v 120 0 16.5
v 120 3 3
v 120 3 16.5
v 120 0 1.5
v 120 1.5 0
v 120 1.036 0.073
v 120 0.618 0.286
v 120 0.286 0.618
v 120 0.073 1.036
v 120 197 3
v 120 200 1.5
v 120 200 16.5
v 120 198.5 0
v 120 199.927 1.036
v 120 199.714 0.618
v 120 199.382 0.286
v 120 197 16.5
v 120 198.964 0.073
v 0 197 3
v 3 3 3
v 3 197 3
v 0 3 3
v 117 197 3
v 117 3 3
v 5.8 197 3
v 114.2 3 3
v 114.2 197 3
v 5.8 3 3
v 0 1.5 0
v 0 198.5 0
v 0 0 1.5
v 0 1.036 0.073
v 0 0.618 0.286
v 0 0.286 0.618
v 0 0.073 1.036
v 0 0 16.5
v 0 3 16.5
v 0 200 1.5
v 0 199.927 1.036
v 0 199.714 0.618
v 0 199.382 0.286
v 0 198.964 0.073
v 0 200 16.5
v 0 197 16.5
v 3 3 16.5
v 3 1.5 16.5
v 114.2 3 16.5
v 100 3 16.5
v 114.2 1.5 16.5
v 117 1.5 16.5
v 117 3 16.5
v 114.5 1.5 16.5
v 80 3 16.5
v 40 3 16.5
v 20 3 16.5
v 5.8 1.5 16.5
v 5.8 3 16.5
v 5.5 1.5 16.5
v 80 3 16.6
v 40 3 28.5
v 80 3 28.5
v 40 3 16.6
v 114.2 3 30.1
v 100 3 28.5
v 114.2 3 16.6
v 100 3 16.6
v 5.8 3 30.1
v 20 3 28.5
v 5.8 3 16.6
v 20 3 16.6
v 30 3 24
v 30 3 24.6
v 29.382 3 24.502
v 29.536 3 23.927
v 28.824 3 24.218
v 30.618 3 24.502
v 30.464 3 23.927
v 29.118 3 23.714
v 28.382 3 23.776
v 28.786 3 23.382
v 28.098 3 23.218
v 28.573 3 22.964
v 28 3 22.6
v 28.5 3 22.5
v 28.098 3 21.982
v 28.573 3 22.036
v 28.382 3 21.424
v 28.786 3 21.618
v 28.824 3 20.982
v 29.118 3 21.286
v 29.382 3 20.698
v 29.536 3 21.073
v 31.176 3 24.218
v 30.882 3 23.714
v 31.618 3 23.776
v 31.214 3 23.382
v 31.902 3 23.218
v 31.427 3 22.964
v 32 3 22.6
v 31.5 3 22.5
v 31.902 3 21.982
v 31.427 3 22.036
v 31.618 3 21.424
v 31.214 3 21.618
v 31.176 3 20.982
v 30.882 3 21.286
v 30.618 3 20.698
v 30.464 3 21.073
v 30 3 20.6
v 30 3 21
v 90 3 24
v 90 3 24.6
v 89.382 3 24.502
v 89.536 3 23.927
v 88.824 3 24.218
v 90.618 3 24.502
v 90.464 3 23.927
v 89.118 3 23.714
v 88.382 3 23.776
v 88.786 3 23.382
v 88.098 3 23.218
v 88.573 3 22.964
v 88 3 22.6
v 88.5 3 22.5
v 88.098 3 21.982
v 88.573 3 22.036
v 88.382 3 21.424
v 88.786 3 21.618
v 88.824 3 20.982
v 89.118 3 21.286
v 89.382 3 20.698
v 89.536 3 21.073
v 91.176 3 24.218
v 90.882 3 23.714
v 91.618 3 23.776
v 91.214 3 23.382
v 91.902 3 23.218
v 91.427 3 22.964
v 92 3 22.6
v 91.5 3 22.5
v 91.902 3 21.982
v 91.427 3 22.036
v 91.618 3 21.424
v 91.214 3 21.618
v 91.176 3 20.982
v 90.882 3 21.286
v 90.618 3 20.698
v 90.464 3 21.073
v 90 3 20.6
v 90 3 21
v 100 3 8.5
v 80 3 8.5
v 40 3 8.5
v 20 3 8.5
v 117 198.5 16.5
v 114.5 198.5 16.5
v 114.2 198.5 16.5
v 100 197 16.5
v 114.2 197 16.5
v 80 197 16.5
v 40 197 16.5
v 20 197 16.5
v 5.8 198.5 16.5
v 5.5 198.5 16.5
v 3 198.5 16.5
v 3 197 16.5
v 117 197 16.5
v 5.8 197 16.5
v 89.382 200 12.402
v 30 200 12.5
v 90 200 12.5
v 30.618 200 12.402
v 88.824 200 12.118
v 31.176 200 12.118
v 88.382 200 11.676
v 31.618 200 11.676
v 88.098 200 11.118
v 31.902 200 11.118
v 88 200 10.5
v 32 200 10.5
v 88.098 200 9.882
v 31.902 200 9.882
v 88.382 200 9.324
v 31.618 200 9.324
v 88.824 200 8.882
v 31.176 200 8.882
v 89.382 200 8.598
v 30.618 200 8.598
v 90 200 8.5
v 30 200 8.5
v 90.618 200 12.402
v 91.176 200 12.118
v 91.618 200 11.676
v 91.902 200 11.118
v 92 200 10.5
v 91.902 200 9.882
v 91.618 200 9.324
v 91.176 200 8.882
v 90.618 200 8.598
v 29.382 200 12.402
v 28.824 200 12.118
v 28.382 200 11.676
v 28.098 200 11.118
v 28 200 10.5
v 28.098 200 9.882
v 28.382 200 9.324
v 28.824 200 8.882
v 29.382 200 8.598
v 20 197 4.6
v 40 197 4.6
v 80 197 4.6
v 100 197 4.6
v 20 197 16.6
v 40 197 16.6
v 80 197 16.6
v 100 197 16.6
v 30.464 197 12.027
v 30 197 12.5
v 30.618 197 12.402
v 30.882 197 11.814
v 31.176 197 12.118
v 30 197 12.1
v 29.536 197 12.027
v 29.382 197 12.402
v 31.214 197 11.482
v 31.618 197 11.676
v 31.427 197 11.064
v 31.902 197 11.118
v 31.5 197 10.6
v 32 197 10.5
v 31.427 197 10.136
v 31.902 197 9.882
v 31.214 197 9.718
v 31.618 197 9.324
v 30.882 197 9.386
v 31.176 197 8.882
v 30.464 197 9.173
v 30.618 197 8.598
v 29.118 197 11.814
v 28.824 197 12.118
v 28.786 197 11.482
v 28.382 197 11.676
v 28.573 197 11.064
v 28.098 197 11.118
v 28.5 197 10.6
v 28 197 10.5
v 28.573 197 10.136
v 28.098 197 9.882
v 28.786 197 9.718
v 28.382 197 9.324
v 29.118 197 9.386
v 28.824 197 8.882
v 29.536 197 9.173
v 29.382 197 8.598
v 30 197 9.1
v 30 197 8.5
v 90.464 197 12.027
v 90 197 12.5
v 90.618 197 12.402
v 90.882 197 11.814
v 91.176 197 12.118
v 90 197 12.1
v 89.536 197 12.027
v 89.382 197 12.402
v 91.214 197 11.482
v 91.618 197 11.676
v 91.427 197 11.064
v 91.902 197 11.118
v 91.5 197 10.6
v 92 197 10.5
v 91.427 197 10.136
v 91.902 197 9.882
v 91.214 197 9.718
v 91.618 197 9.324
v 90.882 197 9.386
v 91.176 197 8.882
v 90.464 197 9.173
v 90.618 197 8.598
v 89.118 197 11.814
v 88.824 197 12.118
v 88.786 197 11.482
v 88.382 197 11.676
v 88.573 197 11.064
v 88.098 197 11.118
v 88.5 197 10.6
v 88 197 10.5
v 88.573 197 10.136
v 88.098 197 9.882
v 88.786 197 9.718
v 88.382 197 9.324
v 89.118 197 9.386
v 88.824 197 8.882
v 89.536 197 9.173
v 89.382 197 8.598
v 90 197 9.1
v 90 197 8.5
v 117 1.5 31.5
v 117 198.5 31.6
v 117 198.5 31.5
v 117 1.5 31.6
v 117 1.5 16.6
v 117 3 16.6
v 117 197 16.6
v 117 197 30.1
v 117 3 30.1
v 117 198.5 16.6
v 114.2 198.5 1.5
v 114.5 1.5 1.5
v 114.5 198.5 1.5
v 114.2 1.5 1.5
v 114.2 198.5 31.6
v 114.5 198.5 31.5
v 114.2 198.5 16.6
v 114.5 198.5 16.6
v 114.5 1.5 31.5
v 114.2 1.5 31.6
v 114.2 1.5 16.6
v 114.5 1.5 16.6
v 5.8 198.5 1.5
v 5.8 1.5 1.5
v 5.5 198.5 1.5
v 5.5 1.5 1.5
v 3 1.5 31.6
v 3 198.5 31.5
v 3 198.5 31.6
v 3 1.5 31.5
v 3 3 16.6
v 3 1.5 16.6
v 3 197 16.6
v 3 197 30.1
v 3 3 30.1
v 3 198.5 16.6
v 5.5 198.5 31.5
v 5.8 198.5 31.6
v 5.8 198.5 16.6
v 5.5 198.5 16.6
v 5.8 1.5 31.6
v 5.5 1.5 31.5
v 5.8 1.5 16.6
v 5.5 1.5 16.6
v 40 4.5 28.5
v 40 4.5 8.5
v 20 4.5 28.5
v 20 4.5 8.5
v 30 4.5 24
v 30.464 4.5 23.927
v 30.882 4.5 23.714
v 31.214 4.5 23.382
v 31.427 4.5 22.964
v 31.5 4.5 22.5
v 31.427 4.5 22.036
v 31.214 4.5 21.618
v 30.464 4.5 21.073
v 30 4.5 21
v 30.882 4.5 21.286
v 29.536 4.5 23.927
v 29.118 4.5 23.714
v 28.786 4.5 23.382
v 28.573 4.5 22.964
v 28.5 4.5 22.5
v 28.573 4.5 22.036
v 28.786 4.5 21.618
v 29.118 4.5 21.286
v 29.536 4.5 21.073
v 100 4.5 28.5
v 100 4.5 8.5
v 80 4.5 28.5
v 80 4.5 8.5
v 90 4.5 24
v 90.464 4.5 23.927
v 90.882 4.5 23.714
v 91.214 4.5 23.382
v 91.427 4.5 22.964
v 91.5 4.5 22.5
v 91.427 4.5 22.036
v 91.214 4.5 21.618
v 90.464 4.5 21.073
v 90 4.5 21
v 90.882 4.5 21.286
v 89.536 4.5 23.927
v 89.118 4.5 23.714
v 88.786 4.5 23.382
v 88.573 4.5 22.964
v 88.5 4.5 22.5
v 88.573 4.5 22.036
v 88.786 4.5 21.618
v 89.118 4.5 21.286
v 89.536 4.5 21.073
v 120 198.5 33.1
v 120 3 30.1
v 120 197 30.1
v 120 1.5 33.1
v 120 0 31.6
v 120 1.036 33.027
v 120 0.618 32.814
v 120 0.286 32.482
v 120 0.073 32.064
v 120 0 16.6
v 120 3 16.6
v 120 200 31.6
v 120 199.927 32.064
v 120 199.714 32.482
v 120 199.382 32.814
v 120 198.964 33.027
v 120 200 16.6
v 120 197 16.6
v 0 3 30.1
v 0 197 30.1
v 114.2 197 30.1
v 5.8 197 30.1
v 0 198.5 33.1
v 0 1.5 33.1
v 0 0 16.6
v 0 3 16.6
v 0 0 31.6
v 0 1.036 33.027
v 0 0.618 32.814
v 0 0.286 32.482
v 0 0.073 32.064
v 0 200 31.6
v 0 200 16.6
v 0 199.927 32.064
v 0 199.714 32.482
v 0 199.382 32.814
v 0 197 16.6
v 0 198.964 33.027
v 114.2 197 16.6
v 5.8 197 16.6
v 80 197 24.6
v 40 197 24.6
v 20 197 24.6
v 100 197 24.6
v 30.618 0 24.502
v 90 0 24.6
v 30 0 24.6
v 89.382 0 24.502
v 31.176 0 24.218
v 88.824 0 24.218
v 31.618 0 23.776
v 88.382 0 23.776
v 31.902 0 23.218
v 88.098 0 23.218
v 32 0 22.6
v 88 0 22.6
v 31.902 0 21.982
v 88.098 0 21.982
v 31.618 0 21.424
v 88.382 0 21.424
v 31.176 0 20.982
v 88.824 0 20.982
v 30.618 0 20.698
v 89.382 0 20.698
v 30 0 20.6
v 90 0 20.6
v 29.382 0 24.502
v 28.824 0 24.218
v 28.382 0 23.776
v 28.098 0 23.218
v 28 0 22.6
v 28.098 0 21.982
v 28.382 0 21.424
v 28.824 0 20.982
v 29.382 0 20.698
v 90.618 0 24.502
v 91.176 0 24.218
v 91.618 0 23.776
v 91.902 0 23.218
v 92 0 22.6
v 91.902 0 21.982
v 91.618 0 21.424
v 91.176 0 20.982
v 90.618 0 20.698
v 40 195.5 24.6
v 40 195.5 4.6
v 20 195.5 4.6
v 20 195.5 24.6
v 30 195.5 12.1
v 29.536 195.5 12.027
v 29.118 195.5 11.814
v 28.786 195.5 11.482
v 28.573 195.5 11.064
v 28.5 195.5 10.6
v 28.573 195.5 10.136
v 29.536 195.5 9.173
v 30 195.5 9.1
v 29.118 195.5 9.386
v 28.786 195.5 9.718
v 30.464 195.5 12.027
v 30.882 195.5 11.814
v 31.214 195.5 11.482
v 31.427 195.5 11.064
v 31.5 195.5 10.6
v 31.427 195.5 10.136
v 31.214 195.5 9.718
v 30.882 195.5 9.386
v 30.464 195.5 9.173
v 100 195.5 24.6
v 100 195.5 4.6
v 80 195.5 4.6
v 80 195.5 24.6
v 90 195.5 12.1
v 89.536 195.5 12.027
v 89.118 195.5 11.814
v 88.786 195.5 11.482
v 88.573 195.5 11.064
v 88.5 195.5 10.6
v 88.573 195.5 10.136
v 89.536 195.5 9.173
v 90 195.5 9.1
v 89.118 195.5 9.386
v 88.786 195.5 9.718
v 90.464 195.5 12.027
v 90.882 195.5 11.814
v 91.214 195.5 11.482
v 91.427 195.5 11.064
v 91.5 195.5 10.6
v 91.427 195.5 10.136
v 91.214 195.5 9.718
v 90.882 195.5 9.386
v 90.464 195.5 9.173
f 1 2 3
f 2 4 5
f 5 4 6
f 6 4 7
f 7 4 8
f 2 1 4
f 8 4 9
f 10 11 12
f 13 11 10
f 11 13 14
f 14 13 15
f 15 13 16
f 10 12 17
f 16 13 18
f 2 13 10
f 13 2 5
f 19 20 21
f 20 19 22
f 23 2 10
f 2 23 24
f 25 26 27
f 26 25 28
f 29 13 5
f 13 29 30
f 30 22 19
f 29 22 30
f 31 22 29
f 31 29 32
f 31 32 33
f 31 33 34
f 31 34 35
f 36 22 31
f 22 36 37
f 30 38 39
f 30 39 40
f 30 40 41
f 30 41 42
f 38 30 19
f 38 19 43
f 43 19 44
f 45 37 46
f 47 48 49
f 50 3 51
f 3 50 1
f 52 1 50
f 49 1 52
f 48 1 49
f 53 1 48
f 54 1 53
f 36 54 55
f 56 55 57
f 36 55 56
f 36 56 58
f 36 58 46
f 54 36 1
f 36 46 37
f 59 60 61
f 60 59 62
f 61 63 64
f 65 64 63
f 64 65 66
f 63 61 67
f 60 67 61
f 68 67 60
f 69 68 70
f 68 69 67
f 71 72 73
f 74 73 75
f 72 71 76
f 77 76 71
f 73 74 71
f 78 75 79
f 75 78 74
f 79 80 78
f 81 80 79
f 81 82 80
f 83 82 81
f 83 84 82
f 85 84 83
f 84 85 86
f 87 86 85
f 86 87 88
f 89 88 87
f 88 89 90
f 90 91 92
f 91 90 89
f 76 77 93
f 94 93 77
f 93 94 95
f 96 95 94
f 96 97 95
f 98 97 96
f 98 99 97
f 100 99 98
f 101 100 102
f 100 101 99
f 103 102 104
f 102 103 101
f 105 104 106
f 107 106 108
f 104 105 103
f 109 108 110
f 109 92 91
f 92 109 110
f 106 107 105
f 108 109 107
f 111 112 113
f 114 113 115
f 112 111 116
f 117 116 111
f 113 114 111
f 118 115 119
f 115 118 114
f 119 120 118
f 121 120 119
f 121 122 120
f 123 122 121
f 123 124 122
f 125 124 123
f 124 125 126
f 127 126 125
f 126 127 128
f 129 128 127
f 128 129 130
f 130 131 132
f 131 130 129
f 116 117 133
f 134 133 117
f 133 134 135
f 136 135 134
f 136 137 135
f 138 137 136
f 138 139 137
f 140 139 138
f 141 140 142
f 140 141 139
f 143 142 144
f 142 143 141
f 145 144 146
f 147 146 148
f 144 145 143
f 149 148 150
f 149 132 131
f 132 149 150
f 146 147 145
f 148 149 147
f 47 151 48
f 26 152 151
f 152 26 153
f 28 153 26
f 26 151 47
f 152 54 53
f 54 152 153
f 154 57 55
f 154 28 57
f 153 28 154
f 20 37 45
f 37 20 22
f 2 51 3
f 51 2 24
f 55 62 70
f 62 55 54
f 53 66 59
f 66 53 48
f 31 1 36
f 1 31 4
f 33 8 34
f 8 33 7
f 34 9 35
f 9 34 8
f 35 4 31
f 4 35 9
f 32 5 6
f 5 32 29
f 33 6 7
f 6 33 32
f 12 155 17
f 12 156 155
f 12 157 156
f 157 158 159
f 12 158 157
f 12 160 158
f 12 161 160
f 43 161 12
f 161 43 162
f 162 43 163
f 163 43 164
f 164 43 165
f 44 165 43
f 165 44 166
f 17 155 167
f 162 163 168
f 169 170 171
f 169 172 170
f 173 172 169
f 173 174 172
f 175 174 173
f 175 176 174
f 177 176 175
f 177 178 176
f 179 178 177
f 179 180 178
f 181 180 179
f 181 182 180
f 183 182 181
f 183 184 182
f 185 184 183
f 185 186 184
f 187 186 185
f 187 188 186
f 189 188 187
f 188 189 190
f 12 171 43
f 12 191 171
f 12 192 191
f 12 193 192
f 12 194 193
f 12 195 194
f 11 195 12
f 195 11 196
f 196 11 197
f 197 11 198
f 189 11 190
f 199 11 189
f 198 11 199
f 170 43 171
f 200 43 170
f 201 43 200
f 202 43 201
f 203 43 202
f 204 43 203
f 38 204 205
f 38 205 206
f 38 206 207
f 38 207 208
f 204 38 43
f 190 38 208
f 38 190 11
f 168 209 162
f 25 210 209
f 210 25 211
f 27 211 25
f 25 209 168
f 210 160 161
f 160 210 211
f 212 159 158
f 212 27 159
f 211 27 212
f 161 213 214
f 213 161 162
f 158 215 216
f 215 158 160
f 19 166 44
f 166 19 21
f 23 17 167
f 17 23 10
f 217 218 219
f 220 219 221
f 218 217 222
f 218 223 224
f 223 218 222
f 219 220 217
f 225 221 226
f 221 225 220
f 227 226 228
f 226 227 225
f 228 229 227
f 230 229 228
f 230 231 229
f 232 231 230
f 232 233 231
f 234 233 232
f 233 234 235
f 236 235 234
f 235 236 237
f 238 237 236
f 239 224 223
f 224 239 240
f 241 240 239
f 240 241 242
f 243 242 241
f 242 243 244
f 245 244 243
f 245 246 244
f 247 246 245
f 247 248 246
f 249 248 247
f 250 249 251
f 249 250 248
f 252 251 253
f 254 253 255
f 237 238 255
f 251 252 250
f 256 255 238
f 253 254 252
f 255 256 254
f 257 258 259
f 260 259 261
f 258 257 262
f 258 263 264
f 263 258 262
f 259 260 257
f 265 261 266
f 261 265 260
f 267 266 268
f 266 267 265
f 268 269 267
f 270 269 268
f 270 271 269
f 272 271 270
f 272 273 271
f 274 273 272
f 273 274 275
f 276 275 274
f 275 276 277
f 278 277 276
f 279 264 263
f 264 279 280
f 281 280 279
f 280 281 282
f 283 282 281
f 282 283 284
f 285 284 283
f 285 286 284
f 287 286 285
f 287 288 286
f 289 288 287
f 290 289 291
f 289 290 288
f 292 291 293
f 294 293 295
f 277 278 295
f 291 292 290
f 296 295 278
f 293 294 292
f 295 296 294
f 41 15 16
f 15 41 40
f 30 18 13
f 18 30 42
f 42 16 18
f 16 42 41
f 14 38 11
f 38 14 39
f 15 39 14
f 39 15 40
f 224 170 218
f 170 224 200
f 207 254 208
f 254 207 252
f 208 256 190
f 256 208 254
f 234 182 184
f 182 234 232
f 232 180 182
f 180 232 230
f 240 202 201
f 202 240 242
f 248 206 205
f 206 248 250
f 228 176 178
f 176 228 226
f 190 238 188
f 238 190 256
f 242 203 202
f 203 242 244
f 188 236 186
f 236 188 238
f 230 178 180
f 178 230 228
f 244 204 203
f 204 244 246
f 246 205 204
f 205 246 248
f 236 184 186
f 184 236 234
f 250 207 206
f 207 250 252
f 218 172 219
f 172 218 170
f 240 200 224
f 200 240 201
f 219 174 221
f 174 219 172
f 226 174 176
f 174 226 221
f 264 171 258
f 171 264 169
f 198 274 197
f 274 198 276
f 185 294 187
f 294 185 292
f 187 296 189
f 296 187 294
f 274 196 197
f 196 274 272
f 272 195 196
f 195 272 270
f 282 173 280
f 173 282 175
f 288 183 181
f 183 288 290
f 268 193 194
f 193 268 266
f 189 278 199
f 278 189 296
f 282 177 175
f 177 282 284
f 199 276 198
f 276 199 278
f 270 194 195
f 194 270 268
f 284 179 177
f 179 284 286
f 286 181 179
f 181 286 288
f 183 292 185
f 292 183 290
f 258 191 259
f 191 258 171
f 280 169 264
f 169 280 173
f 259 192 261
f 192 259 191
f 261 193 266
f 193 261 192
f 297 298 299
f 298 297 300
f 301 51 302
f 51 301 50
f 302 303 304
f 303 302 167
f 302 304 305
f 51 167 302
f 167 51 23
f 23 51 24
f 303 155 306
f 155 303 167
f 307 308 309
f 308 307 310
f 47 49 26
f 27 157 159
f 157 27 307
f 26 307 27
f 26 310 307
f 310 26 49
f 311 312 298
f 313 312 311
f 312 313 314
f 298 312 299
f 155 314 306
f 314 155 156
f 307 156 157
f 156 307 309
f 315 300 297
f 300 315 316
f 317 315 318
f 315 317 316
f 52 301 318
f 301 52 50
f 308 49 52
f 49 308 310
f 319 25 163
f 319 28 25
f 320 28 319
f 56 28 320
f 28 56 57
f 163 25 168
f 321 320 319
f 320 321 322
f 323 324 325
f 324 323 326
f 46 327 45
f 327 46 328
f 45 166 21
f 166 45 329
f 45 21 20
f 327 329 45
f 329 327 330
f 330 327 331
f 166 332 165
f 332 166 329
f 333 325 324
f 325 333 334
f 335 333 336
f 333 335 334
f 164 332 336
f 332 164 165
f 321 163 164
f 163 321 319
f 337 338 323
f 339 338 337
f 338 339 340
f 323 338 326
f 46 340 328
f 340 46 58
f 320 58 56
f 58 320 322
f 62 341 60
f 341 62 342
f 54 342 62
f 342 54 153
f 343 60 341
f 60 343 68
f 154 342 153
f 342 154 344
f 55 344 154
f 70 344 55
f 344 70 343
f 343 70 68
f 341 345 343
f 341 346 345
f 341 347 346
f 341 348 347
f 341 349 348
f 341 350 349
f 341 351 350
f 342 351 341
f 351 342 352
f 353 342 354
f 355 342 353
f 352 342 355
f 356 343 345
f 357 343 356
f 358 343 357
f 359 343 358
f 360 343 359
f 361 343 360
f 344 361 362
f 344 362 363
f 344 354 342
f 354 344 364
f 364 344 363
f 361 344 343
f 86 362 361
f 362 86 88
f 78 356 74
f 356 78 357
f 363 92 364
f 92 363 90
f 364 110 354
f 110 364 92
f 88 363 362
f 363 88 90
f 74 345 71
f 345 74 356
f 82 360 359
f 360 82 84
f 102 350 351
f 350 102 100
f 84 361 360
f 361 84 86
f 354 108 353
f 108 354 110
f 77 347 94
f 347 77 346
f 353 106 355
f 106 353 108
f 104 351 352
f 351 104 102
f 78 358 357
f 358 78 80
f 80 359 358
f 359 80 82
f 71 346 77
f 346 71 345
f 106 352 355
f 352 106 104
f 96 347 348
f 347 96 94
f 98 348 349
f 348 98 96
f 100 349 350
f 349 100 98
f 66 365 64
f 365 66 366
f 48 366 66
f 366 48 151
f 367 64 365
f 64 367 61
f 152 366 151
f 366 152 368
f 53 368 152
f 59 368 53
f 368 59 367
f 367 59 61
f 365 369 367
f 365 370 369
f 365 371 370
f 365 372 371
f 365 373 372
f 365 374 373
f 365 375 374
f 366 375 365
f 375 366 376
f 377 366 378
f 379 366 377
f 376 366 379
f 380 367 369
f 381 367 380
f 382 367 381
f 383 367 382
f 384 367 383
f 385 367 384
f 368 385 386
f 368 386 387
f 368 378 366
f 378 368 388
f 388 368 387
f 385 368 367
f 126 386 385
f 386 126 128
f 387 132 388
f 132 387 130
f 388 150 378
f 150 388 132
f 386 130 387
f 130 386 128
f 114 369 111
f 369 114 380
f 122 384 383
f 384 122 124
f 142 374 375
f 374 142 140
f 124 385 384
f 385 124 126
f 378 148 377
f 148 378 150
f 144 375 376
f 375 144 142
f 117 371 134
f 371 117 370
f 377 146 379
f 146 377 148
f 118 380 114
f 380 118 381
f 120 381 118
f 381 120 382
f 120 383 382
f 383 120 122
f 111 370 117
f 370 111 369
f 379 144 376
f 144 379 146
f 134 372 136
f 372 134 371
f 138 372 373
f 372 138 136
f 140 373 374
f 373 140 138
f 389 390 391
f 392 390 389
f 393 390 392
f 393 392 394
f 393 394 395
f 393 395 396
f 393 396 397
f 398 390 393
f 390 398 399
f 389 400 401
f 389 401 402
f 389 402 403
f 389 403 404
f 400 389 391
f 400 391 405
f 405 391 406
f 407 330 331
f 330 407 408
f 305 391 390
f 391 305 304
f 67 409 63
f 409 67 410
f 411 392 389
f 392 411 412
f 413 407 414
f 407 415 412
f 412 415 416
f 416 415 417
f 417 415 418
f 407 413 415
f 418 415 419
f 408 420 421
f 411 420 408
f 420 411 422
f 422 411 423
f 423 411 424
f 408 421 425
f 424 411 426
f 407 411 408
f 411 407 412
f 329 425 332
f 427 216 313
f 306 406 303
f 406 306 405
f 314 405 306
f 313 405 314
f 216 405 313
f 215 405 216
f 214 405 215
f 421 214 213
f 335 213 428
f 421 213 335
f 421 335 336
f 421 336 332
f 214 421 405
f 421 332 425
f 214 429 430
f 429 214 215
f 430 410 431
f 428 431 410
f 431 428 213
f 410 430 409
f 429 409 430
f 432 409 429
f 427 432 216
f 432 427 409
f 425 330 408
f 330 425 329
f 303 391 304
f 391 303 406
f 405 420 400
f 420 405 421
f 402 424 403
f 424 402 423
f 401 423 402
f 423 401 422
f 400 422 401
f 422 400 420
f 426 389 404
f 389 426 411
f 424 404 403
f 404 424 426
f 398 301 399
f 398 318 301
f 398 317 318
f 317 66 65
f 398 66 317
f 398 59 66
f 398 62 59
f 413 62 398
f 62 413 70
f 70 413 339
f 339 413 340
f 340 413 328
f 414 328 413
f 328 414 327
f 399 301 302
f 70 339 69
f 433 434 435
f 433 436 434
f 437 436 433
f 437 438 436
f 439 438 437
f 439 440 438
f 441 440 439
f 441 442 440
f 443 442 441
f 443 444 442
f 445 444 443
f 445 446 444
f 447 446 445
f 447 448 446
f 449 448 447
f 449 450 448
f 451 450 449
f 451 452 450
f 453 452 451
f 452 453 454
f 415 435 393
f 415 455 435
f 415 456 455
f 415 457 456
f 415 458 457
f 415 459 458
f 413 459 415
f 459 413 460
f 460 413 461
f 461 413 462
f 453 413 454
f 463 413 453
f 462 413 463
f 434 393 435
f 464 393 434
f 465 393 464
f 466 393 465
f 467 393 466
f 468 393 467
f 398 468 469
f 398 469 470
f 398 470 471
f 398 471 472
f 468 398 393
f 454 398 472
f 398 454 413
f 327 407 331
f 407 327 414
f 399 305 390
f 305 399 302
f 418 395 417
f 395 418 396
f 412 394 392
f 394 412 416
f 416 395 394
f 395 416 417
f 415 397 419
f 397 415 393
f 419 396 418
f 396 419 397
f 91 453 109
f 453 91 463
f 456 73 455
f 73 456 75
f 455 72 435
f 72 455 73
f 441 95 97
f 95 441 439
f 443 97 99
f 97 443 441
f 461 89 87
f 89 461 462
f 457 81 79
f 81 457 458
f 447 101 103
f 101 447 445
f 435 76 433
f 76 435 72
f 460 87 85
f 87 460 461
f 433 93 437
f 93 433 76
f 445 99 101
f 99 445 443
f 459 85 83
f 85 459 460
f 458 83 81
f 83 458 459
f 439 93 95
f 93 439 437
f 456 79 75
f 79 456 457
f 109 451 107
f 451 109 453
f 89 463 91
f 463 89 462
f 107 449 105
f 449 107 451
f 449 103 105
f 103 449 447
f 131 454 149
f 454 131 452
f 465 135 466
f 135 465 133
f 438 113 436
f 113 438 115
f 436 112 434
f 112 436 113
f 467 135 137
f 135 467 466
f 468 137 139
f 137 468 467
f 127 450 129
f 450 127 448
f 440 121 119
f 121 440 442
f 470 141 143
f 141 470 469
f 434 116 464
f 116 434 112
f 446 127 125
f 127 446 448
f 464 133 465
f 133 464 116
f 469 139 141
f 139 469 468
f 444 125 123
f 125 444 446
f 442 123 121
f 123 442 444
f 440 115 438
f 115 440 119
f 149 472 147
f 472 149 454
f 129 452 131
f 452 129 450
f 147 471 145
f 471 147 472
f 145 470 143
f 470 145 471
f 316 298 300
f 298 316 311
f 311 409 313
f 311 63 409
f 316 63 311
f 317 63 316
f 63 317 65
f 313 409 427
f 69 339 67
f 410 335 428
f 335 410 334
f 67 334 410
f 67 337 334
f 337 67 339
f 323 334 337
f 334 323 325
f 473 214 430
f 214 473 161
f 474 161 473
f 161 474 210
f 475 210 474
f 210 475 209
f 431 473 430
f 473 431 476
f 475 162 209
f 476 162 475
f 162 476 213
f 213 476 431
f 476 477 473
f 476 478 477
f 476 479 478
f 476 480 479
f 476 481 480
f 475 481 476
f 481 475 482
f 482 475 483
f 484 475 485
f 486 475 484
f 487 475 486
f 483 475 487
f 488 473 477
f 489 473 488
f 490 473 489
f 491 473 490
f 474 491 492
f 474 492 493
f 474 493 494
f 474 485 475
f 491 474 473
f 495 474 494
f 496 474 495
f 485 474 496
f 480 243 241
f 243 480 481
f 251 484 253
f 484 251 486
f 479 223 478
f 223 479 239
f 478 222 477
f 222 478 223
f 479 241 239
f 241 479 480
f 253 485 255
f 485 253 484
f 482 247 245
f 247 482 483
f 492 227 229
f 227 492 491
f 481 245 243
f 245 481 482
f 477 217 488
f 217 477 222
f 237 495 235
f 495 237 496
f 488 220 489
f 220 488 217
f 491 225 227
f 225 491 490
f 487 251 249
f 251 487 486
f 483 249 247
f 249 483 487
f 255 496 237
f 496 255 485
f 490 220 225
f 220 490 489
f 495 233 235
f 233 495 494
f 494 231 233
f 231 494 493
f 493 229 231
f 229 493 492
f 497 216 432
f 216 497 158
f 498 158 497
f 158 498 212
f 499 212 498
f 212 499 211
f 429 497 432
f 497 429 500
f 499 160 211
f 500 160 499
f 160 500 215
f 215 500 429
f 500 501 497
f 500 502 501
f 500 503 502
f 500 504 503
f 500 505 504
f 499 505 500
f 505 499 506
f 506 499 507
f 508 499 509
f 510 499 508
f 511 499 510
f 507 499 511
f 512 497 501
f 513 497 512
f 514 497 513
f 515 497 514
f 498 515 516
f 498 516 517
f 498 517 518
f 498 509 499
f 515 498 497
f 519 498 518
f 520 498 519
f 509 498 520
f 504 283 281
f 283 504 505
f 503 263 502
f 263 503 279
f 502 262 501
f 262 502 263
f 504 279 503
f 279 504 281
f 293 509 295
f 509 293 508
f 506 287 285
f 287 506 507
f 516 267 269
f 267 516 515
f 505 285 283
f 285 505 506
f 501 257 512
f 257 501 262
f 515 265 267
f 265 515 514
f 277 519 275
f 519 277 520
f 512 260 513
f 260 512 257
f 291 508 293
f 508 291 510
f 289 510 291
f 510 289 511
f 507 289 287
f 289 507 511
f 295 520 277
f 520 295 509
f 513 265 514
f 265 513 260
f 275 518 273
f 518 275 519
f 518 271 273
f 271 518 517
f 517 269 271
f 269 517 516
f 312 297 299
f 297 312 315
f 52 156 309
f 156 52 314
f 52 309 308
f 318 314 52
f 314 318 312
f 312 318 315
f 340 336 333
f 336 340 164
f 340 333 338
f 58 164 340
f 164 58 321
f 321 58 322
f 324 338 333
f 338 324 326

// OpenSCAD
$fn = 20;

/* Parameters */
case_width = 200;
case_depth = 120;
case_height = 30;
case_thickness = 3;
panel_thickness = 2.5;
panel_indent = 3;

module front_panel(thickness = 2.5,
                   indent = 7) {
  x = case_depth - indent - thickness;
  y = case_thickness / 2;
  z = case_thickness / 2;
  translate([x, y, z])
  cube([thickness,
        case_width - case_thickness,
        case_height]);
}

module back_panel(thickness = 2.5,
                  indent = 7) {
  x = indent;
  y = case_thickness / 2;
  z = case_thickness / 2;
  translate([x, y, z])
  cube([thickness,
        case_width - case_thickness,
        case_height]);
}

module fixtures() {
  y = case_thickness + case_thickness / 4;
  z = case_height / 2.0 + case_thickness / 2;
  difference() {
    translate([case_depth * 0.25, y, z])
      translate([0, 0, 2])
      cube([20, case_thickness / 2, 20],
            center=true);

    translate([case_depth * 0.25, y, z + 6])
      rotate([0.0, 90.0, 90.0])
      cylinder(h=case_thickness * 1.01, r=1.5, center=true);
  }

  difference() {
    translate([case_depth * 0.75, y, z])
      translate([0, 0, 2])
      cube([20, case_thickness / 2, 20],
            center=true);

    translate([case_depth * 0.75, y, z + 6])
      rotate([0.0, 90.0, 90.0])
      cylinder(h=case_thickness * 1.01, r=1.5, center=true);
  }
}

module mount_holes() {
  y = case_width - case_thickness / 2;
  z = case_height / 2.0 + case_thickness / 2;
  translate([case_depth * 0.25, y, z - 6])
    rotate([0.0, 90.0, 90.0])
    cylinder(h=case_thickness * 1.01, r=2.0, center=true);

  translate([case_depth * 0.75, y, z - 6])
    rotate([0.0, 90.0, 90.0])
    cylinder(h=case_thickness * 1.01, r=2.0, center=true);
}

module case() {
  difference() {
    color([0.2, 0.2, 0.2]) {
      // Base
      translate([0.0, case_thickness / 2, 0.0])
      cube([case_depth, case_width - case_thickness, case_thickness]);

      // Right wall
      translate([0.0, 0.0, case_thickness / 2])
      cube([case_depth, case_thickness, case_height / 2]);
      // -- Fillet
      translate([case_depth/ 2.0, case_thickness / 2.0, case_thickness / 2.0])
      rotate([0.0, 90.0, 0.0])
      cylinder(h=case_depth, r=case_thickness / 2, center=true);

      // Left wall
      translate([0.0, case_width - case_thickness, case_thickness / 2])
      cube([case_depth, case_thickness, case_height / 2]);
      // -- Fillet
      x = case_depth / 2.0;
      y = case_thickness / 2.0 + case_width - case_thickness;
      z = case_thickness / 2.0;
      translate([x, y, z])
      rotate([0.0, 90.0, 0.0])
      cylinder(h=case_depth, r=case_thickness / 2, center=true);
    }

    // Front and back panel grooves
    front_panel(panel_thickness + 0.3, panel_indent);
    back_panel(panel_thickness + 0.3, panel_indent);
    mount_holes();
  }

  fixtures();
}

module base_shell() {
  case();
}

module top_shell() {
  translate([0.0, case_width, case_height + case_thickness])
    rotate([180.0, 0.0, 0.0])
      case();
}

// Main
color("blue") base_shell();
translate([0, 0, 0.1]) color("blue") top_shell();

color("grey") front_panel(panel_thickness, panel_indent);
color("grey") back_panel(panel_thickness, panel_indent);
